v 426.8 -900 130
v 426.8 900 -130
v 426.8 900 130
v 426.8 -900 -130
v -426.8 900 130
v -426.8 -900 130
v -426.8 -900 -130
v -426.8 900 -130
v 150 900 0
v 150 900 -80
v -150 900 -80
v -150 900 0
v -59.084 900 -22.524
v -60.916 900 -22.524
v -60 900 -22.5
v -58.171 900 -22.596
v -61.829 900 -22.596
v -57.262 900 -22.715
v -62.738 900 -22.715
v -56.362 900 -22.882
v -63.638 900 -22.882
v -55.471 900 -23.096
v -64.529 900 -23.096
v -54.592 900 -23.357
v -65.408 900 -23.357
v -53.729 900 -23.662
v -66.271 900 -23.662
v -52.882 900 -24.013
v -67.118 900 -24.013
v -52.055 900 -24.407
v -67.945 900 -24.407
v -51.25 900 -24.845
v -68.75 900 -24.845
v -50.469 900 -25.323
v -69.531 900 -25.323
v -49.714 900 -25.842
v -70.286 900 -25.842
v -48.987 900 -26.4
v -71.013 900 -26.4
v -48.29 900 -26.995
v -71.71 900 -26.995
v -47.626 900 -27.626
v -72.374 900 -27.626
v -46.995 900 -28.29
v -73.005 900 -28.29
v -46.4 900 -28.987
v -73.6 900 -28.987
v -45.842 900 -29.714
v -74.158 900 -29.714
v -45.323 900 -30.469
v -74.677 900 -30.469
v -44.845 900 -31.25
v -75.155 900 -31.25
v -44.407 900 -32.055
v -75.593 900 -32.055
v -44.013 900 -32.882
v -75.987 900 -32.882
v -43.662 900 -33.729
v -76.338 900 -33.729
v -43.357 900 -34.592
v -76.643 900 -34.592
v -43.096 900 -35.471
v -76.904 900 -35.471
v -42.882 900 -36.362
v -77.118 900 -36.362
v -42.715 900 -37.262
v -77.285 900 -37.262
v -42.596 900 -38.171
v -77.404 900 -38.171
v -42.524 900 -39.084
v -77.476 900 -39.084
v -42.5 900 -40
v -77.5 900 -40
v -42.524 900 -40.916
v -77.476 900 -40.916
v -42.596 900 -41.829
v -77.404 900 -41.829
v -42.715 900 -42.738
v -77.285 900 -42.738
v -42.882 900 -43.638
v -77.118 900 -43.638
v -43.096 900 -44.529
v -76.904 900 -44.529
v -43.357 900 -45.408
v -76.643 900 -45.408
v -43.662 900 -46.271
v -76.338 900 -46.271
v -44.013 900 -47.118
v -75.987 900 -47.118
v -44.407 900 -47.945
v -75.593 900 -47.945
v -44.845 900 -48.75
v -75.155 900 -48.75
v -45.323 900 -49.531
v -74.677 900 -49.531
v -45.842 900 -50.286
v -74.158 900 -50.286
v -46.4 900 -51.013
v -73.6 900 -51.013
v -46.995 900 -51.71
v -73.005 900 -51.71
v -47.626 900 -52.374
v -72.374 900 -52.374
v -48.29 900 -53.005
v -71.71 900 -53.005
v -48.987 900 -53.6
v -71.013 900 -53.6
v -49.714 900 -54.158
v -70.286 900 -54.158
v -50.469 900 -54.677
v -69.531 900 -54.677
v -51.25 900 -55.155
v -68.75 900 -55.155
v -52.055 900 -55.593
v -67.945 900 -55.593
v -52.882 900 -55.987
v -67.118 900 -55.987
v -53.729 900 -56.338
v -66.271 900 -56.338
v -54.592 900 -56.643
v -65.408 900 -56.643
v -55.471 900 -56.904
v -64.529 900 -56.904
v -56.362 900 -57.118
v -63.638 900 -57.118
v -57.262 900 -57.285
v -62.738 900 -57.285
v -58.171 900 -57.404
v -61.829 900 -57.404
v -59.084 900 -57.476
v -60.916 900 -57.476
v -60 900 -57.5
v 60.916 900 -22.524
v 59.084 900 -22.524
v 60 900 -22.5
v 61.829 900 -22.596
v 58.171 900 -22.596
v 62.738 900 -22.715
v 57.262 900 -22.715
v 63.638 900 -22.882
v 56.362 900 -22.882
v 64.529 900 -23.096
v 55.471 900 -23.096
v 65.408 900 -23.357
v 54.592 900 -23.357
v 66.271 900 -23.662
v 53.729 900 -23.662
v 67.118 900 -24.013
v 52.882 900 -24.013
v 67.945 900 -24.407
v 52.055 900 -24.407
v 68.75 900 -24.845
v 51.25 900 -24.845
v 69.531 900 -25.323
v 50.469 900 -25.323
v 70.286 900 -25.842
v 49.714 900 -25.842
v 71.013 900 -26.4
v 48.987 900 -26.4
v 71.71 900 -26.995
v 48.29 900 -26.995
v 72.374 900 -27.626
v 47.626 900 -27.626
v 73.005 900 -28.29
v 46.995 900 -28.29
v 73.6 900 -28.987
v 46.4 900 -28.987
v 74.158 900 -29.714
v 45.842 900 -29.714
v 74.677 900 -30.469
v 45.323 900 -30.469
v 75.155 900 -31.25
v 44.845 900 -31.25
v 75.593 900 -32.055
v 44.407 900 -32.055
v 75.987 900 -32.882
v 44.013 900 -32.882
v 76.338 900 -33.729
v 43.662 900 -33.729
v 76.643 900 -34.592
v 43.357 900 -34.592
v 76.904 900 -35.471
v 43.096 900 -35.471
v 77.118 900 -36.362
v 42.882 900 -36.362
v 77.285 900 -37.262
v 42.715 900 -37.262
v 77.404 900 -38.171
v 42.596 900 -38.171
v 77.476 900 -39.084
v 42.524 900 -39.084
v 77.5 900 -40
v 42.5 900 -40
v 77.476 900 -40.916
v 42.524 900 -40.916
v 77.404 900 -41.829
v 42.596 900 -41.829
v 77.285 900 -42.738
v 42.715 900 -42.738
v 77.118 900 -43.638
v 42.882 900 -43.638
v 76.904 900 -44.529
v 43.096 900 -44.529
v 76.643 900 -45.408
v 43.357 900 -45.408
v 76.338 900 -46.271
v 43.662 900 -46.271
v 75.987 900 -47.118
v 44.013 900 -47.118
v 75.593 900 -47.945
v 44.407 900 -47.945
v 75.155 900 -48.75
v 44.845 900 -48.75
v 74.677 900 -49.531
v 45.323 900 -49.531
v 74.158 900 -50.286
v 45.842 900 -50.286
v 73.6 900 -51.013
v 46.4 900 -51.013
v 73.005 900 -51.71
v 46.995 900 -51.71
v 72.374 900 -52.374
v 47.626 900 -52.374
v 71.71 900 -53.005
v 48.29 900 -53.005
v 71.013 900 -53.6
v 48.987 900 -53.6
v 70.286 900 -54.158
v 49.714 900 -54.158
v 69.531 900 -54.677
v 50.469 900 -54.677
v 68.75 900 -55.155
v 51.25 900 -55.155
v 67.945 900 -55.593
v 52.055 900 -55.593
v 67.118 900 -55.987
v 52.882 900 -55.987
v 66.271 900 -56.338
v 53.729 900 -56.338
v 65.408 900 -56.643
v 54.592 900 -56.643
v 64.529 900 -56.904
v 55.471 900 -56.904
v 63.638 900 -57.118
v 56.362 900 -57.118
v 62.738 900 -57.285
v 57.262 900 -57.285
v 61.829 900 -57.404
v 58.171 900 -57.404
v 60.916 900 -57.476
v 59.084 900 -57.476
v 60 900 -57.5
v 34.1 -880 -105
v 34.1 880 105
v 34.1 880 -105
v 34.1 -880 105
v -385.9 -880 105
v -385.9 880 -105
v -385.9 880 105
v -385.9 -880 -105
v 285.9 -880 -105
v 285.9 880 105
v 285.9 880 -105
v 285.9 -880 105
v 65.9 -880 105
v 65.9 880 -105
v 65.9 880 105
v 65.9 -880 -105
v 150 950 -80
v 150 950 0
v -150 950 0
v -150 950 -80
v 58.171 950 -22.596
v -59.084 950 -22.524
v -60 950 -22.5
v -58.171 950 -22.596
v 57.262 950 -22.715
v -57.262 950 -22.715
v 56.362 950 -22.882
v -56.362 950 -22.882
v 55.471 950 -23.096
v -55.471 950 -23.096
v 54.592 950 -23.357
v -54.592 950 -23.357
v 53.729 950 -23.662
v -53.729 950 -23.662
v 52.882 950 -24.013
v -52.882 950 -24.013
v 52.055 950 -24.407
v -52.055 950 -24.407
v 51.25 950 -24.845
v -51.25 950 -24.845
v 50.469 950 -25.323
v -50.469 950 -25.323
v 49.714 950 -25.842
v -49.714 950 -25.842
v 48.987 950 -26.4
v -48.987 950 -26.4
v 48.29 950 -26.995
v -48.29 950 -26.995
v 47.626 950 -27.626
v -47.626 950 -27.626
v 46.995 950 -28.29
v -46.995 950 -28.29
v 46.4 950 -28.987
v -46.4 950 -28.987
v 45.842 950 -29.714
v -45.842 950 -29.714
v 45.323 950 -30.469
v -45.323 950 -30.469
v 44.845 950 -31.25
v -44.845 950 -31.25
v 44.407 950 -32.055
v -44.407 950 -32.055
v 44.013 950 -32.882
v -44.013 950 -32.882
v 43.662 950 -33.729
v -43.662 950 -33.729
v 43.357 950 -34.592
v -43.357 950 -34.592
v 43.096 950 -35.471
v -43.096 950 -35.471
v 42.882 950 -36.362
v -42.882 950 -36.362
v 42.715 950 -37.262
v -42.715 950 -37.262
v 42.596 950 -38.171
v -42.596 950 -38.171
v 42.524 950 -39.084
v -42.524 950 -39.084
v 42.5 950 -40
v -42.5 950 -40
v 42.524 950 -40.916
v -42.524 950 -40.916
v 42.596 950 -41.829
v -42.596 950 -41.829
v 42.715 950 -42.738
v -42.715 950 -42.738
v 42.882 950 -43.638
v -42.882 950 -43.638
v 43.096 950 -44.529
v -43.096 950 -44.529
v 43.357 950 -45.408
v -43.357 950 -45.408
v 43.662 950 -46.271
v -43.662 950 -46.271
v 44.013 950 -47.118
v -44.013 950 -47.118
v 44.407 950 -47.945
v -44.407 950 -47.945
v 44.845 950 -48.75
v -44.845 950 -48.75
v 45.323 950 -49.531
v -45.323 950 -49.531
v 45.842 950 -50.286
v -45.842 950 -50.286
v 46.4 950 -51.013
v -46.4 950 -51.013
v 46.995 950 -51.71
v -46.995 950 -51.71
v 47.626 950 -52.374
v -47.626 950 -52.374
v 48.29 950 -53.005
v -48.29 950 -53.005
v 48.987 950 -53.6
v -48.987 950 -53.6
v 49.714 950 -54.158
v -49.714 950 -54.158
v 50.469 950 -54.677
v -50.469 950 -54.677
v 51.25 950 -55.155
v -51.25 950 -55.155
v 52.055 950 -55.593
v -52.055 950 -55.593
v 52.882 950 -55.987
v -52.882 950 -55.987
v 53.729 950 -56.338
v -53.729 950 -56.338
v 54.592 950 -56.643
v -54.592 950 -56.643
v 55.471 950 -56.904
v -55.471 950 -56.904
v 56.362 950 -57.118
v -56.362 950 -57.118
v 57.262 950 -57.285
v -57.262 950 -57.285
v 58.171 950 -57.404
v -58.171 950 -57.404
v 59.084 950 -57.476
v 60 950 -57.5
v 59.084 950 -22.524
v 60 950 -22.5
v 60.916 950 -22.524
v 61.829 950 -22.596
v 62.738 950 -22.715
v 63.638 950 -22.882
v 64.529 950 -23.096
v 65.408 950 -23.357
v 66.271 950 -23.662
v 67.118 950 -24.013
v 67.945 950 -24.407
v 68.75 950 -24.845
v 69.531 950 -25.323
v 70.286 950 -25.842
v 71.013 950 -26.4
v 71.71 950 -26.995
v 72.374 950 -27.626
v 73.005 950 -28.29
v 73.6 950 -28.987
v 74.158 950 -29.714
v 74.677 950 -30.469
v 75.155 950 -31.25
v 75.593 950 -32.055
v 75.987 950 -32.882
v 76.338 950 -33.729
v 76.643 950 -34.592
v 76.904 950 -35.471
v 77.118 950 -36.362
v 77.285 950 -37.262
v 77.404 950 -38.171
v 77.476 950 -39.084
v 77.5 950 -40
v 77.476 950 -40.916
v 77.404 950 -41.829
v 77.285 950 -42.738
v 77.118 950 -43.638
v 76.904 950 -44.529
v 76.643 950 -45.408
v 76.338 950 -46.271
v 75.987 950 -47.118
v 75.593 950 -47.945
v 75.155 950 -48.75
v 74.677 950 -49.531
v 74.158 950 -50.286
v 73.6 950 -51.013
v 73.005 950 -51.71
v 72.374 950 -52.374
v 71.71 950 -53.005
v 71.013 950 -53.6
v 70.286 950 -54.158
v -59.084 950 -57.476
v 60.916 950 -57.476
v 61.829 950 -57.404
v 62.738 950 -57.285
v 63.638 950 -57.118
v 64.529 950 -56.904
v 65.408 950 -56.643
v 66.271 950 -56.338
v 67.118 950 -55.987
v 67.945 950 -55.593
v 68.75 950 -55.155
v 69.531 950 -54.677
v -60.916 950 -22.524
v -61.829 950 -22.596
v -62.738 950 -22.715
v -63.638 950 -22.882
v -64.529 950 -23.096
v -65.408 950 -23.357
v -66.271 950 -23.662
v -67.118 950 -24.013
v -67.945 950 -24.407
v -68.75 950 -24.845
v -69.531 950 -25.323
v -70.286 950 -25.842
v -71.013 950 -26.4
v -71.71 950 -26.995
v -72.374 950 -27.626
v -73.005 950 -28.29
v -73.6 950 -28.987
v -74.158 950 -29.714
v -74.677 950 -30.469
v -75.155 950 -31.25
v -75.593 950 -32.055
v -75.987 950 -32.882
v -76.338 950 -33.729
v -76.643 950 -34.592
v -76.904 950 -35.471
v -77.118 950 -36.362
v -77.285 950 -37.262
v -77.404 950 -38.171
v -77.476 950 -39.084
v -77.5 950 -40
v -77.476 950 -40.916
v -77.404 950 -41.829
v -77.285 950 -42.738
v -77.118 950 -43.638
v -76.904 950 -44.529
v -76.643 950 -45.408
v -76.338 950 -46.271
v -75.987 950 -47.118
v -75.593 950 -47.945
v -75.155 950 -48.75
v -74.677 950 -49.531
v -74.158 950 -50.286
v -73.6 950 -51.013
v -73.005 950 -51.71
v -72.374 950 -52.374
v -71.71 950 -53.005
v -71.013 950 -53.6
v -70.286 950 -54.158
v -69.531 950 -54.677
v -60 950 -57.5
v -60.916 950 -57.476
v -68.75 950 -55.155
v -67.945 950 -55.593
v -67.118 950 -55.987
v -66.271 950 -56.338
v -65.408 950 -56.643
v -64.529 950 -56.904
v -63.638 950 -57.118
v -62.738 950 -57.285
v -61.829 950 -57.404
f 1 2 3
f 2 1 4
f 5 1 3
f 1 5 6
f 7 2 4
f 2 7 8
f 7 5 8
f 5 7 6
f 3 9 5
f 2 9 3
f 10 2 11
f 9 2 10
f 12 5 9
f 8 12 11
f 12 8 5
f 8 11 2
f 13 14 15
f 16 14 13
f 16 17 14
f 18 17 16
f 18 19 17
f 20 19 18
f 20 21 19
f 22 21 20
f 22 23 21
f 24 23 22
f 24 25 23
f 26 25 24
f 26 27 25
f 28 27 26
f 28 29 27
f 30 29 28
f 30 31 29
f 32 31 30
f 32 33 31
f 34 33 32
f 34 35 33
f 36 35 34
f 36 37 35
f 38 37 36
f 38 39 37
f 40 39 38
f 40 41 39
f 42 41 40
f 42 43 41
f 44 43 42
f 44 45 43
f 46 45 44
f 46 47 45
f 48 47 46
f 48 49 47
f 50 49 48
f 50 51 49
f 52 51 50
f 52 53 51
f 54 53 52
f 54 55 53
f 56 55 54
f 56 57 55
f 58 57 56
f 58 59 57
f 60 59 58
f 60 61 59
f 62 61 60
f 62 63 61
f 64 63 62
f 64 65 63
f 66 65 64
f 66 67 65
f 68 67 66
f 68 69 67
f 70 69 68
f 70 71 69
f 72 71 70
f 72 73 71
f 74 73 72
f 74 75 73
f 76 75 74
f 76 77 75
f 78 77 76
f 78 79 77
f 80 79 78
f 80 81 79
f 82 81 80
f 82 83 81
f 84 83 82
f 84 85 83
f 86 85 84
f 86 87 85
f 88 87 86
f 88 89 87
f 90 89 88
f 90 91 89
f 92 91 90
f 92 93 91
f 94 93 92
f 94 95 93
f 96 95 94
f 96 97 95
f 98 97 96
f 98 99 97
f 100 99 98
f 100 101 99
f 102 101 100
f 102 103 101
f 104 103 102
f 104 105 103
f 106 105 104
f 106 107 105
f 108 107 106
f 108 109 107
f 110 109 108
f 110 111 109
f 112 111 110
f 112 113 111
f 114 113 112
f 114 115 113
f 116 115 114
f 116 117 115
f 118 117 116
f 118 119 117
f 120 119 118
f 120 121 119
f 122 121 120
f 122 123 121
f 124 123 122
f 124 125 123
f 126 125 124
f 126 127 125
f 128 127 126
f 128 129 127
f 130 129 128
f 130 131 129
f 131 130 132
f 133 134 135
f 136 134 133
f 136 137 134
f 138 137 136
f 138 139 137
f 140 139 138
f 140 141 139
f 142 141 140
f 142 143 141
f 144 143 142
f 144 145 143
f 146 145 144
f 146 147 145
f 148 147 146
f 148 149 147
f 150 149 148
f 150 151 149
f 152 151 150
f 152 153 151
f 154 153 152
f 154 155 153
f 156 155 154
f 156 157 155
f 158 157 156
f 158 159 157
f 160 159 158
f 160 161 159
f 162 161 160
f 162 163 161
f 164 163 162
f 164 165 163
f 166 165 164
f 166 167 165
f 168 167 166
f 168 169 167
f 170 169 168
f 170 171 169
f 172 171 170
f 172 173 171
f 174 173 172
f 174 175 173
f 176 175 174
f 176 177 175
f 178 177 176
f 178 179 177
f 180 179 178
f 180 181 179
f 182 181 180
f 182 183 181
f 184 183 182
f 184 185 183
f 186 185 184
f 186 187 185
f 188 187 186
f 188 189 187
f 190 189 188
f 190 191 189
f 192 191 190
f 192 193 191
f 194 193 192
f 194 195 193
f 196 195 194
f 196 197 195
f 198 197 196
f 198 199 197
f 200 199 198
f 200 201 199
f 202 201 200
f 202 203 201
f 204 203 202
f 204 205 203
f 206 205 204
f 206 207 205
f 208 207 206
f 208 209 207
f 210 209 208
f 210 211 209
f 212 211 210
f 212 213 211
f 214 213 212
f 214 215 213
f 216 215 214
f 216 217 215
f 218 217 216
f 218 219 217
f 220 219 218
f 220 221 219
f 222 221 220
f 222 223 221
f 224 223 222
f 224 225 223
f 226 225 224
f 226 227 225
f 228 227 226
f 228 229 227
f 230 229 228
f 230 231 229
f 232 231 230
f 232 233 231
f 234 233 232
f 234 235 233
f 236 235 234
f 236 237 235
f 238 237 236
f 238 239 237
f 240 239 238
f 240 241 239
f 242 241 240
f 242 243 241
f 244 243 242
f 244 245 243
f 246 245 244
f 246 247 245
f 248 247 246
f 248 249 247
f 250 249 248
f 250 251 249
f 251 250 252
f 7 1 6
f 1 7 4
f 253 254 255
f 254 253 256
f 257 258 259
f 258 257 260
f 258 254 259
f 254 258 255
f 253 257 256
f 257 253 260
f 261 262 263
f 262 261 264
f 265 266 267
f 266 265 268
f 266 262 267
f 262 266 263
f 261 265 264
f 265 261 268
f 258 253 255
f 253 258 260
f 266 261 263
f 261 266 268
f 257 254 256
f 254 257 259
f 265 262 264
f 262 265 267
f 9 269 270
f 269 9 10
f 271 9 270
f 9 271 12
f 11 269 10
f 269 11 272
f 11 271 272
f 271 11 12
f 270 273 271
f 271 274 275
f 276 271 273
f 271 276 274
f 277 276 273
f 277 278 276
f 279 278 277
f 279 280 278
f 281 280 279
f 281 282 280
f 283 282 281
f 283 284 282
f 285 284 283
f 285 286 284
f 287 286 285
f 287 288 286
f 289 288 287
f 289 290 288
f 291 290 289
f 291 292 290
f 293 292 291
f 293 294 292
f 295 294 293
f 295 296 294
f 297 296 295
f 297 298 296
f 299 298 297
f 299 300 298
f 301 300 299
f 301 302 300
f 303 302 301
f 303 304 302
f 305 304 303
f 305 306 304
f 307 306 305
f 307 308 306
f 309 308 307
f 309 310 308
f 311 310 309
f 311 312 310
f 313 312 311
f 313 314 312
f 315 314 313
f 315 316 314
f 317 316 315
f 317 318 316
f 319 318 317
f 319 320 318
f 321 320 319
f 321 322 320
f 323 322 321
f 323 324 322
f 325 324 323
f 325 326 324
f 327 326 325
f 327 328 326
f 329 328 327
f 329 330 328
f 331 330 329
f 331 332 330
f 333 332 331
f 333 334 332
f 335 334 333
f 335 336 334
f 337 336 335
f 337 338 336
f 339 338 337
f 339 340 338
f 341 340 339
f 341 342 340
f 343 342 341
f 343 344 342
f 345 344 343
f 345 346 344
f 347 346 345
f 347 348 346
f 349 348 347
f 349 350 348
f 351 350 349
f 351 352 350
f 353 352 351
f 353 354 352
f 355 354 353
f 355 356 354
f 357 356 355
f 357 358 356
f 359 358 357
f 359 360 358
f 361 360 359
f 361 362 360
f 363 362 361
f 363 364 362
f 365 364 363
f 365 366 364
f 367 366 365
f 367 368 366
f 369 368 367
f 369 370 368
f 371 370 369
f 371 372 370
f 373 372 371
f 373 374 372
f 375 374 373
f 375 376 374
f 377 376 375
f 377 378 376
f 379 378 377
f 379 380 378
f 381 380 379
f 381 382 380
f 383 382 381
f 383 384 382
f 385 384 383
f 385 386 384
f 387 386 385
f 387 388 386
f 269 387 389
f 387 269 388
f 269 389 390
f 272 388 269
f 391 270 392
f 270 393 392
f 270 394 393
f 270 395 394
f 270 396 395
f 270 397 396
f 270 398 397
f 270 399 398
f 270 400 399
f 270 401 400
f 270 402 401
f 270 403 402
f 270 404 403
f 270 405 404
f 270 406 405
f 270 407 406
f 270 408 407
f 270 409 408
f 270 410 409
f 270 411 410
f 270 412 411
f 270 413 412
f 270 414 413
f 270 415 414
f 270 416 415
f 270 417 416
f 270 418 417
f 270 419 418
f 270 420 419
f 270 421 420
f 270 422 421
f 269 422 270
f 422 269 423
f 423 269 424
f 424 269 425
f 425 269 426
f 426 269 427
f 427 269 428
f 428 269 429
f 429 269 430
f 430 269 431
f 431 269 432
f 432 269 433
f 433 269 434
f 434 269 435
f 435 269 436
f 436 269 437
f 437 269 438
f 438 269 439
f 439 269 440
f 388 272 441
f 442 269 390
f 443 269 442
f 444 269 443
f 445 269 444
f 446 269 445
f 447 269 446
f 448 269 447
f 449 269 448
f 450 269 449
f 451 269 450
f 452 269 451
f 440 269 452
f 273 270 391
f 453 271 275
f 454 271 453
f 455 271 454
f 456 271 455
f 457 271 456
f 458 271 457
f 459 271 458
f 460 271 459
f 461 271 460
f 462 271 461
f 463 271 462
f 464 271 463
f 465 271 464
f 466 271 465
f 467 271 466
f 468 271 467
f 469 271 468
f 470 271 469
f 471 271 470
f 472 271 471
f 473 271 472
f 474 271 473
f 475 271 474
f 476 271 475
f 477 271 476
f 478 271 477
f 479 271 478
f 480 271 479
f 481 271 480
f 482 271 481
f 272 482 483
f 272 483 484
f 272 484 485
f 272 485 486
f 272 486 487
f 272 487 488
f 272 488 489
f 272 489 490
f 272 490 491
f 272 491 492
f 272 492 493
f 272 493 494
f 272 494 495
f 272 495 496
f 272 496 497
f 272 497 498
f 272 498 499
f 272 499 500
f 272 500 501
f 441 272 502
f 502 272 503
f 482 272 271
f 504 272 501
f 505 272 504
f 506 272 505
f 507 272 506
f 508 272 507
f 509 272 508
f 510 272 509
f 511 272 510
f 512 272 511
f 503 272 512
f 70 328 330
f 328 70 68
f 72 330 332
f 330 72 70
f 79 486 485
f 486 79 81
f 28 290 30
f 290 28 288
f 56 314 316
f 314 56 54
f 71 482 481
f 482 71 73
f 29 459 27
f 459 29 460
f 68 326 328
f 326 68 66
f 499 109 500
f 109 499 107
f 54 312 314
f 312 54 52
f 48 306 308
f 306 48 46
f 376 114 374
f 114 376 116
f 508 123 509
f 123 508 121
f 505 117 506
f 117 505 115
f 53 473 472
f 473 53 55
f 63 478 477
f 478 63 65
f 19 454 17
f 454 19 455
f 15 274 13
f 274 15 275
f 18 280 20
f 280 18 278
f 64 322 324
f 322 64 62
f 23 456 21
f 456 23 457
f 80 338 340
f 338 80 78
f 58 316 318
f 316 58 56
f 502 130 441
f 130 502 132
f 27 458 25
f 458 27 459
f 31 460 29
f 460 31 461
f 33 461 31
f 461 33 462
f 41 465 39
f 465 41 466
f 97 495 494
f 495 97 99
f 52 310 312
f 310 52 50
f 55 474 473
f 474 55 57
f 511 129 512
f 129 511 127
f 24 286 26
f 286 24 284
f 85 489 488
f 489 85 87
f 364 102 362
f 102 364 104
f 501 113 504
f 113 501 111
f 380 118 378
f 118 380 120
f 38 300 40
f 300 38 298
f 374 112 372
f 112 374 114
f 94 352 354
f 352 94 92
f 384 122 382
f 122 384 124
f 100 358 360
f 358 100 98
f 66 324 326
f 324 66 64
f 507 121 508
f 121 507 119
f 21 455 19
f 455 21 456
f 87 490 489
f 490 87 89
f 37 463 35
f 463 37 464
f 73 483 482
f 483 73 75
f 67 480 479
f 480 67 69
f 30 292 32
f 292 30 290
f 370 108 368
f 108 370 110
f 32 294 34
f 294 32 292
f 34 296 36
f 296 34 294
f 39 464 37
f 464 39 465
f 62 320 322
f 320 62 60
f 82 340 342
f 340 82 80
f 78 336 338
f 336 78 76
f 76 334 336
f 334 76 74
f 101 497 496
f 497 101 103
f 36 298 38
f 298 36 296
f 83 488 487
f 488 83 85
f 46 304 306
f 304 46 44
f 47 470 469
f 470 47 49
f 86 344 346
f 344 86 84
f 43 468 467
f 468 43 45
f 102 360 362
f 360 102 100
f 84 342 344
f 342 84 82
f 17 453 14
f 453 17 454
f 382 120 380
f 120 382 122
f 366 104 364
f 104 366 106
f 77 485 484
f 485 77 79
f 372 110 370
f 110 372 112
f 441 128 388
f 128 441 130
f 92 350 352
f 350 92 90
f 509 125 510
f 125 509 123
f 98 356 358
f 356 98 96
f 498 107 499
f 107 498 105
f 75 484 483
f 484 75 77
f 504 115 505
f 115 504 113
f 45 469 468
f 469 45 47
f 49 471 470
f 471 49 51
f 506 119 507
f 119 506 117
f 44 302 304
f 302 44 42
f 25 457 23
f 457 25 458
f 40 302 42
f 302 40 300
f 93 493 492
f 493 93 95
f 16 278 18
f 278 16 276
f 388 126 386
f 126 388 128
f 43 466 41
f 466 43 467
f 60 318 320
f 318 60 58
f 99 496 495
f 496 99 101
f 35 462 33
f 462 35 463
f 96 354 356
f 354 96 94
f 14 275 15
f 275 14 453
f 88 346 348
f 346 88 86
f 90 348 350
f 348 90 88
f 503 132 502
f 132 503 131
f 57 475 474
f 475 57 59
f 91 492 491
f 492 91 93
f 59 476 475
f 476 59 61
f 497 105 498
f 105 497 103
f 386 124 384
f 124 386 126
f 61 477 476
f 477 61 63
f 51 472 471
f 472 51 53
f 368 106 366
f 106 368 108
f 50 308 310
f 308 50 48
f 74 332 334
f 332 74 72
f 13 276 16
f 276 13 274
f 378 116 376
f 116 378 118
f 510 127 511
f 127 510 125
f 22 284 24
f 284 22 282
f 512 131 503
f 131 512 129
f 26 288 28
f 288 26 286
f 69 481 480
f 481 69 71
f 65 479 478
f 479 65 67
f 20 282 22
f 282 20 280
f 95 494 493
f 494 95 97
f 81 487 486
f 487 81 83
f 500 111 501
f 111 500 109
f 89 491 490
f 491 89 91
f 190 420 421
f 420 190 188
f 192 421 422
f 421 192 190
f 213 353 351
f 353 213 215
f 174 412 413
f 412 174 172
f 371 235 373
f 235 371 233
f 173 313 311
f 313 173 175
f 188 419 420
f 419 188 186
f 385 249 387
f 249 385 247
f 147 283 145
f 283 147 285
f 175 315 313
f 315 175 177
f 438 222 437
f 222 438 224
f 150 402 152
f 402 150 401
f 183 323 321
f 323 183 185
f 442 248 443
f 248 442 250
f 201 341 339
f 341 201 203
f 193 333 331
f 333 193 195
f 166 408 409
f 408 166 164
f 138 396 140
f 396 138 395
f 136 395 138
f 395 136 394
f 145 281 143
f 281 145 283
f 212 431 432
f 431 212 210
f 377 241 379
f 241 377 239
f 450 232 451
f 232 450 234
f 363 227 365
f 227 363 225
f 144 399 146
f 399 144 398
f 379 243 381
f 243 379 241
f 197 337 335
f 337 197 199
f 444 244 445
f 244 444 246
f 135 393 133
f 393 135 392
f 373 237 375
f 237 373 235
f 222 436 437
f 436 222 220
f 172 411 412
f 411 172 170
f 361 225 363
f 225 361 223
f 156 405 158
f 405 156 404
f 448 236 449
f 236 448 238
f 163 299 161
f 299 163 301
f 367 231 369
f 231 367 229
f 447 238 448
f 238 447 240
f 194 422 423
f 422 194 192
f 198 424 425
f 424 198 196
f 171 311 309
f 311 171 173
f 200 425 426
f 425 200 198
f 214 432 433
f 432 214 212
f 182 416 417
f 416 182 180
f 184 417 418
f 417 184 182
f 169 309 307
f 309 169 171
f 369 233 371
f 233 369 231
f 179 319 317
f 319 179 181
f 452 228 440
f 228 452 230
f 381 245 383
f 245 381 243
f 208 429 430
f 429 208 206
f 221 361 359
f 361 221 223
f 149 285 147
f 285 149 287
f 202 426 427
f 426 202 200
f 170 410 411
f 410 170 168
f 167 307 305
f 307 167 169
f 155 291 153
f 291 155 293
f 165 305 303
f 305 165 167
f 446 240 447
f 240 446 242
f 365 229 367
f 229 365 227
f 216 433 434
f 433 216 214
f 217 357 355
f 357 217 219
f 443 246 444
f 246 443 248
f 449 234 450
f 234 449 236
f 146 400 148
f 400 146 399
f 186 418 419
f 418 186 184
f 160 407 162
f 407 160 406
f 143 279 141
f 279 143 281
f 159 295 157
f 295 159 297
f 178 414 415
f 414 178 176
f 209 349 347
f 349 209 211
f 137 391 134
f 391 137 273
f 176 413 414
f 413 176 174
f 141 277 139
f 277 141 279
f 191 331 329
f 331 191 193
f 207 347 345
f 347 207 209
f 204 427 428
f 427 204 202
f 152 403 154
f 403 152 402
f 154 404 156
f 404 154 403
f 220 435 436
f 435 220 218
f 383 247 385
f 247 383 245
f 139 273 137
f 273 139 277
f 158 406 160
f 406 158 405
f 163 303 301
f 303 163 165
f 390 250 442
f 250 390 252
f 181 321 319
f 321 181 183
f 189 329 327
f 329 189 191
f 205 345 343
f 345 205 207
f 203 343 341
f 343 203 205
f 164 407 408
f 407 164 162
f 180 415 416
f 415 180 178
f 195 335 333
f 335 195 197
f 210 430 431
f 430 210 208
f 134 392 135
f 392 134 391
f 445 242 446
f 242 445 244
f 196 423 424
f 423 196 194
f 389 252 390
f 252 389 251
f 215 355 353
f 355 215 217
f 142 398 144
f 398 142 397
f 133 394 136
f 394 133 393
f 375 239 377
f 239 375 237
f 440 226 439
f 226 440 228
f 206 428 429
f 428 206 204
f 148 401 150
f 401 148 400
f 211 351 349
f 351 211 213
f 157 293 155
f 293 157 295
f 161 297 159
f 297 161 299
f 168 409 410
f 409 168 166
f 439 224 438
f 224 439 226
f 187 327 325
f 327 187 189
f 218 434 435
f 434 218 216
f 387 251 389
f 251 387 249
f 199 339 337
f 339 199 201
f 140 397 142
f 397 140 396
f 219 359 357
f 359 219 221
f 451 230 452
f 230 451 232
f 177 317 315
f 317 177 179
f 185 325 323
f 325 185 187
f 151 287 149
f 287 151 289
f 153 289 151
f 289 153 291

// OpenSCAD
// ====================================================================================
// REVOLUTIONARY TECHNOLOGY COMPANY & UNIVERSITY OF WASHINGTON DEPARTMENT OF PHYSICS
// Subsystem: silverado_md_hybrid_pack.scad (Commercial 800V Hybrid Energy Core)
// Core Specifications: RT-Certified Thermal Infrastructure / Multi-Chamber Shield
// COMPLIANCE GATE: Form-fitted to clear the 65mm lower armor clearance envelope [INDEX]
// Center Origin (0,0,0) = Geometric Centerpoint of the Underbelly Battery Pan
// ====================================================================================

$fn = 120; // High-precision CNC milling and waterjet cutting track paths

// --- Commercial Fleet Pack Dimensions (mm) ---
inch_to_mm         = 25.4;
frame_rail_spacing = 34.0 * inch_to_mm;  // 863.60 mm standard straight truck width [INDEX]
pack_total_length  = 1800.00;          // Spans longitudinally within the mid-chassis rails [INDEX]
pack_total_height  = 260.00;           // Deep dual-tier cell storage capacity [INDEX]
wall_thickness_ti  = 8.00;             // Reinforced 8mm Titanium Grade 5 impact walls [INDEX]

// Internal Chamber Partition Sizing (mm)
battery_cell_chamber_w = 420.00;      // Allocates space for 800V LiFePO4 cells [INDEX]
capacitor_array_w      = 220.00;       // Allocates space for the instant-discharge caps [INDEX]
vapor_chamber_height   = 20.00;        // 3D Vapor Chamber layer room for thermal management [INDEX]

module heavy_commercial_battery_casing() {
    echo("MILLING COMMERCIAL HIGH-DENSITY STRUCTURAL PACK CASING WITH INTEGRATED VAPOR FLANGES");
    color("DimGrey") {
        difference() {
            // Main solid underbody hybrid power pack vault brick
            cube([frame_rail_spacing - 10, pack_total_length, pack_total_height], center=true);
            
            // 1. PRIMARY LITHIUM CELL CHAMBER VOLUME
            translate([-frame_rail_spacing/4 + 40, 0, 0])
                cube([battery_cell_chamber_w, pack_total_length - 40, pack_total_height - (2*wall_thickness_ti)], center=true);
                
            // 2. ISOLATED ULTRA-CAPACITOR DRIVE CHAMBER
            translate([frame_rail_spacing/4 - 40, 0, 0])
                cube([capacitor_array_w, pack_total_length - 40, pack_total_height - (2*wall_thickness_ti)], center=true);
        }
    }
}

module rt_thermal_management_armor() {
    // Generates the horizontal multi-stage cooling lines and phase-change plate cavities [INDEX]
    color("Copper") {
        for (z_offset = [-pack_total_height/2 + 15, pack_total_height/2 - 15]) {
            translate([0, 0, z_offset])
                // RT Phase-Change cooling tracks extending horizontally to the radiator channels
                cube([frame_rail_spacing - 30, pack_total_length - 20, vapor_chamber_height], center=true);
        }
    }
}

module external_inverter_outlet_bracket() {
    // Heavy-duty terminal block extension where the auxiliary 120V AC inverter links [INDEX]
    color("Silver") {
        translate([0, pack_total_length/2 + 25, -40]) {
            difference() {
                cube([300.0, 50.0, 80.0], center=true);
                // Pre-cut port pass-throughs for the thick 3oz high-draw copper output tracks [INDEX]
                translate([-60, 0, 0]) rotate([90, 0, 0]) cylinder(d=35, h=55, center=true);
                translate([60, 0, 0])  rotate([90, 0, 0]) cylinder(d=35, h=55, center=true);
            }
        }
    }
}

// --- Composite Structural Energy Vault Instantiation ---
union() {
    heavy_commercial_battery_casing();
    rt_thermal_management_armor();
    external_inverter_outlet_bracket();
}
